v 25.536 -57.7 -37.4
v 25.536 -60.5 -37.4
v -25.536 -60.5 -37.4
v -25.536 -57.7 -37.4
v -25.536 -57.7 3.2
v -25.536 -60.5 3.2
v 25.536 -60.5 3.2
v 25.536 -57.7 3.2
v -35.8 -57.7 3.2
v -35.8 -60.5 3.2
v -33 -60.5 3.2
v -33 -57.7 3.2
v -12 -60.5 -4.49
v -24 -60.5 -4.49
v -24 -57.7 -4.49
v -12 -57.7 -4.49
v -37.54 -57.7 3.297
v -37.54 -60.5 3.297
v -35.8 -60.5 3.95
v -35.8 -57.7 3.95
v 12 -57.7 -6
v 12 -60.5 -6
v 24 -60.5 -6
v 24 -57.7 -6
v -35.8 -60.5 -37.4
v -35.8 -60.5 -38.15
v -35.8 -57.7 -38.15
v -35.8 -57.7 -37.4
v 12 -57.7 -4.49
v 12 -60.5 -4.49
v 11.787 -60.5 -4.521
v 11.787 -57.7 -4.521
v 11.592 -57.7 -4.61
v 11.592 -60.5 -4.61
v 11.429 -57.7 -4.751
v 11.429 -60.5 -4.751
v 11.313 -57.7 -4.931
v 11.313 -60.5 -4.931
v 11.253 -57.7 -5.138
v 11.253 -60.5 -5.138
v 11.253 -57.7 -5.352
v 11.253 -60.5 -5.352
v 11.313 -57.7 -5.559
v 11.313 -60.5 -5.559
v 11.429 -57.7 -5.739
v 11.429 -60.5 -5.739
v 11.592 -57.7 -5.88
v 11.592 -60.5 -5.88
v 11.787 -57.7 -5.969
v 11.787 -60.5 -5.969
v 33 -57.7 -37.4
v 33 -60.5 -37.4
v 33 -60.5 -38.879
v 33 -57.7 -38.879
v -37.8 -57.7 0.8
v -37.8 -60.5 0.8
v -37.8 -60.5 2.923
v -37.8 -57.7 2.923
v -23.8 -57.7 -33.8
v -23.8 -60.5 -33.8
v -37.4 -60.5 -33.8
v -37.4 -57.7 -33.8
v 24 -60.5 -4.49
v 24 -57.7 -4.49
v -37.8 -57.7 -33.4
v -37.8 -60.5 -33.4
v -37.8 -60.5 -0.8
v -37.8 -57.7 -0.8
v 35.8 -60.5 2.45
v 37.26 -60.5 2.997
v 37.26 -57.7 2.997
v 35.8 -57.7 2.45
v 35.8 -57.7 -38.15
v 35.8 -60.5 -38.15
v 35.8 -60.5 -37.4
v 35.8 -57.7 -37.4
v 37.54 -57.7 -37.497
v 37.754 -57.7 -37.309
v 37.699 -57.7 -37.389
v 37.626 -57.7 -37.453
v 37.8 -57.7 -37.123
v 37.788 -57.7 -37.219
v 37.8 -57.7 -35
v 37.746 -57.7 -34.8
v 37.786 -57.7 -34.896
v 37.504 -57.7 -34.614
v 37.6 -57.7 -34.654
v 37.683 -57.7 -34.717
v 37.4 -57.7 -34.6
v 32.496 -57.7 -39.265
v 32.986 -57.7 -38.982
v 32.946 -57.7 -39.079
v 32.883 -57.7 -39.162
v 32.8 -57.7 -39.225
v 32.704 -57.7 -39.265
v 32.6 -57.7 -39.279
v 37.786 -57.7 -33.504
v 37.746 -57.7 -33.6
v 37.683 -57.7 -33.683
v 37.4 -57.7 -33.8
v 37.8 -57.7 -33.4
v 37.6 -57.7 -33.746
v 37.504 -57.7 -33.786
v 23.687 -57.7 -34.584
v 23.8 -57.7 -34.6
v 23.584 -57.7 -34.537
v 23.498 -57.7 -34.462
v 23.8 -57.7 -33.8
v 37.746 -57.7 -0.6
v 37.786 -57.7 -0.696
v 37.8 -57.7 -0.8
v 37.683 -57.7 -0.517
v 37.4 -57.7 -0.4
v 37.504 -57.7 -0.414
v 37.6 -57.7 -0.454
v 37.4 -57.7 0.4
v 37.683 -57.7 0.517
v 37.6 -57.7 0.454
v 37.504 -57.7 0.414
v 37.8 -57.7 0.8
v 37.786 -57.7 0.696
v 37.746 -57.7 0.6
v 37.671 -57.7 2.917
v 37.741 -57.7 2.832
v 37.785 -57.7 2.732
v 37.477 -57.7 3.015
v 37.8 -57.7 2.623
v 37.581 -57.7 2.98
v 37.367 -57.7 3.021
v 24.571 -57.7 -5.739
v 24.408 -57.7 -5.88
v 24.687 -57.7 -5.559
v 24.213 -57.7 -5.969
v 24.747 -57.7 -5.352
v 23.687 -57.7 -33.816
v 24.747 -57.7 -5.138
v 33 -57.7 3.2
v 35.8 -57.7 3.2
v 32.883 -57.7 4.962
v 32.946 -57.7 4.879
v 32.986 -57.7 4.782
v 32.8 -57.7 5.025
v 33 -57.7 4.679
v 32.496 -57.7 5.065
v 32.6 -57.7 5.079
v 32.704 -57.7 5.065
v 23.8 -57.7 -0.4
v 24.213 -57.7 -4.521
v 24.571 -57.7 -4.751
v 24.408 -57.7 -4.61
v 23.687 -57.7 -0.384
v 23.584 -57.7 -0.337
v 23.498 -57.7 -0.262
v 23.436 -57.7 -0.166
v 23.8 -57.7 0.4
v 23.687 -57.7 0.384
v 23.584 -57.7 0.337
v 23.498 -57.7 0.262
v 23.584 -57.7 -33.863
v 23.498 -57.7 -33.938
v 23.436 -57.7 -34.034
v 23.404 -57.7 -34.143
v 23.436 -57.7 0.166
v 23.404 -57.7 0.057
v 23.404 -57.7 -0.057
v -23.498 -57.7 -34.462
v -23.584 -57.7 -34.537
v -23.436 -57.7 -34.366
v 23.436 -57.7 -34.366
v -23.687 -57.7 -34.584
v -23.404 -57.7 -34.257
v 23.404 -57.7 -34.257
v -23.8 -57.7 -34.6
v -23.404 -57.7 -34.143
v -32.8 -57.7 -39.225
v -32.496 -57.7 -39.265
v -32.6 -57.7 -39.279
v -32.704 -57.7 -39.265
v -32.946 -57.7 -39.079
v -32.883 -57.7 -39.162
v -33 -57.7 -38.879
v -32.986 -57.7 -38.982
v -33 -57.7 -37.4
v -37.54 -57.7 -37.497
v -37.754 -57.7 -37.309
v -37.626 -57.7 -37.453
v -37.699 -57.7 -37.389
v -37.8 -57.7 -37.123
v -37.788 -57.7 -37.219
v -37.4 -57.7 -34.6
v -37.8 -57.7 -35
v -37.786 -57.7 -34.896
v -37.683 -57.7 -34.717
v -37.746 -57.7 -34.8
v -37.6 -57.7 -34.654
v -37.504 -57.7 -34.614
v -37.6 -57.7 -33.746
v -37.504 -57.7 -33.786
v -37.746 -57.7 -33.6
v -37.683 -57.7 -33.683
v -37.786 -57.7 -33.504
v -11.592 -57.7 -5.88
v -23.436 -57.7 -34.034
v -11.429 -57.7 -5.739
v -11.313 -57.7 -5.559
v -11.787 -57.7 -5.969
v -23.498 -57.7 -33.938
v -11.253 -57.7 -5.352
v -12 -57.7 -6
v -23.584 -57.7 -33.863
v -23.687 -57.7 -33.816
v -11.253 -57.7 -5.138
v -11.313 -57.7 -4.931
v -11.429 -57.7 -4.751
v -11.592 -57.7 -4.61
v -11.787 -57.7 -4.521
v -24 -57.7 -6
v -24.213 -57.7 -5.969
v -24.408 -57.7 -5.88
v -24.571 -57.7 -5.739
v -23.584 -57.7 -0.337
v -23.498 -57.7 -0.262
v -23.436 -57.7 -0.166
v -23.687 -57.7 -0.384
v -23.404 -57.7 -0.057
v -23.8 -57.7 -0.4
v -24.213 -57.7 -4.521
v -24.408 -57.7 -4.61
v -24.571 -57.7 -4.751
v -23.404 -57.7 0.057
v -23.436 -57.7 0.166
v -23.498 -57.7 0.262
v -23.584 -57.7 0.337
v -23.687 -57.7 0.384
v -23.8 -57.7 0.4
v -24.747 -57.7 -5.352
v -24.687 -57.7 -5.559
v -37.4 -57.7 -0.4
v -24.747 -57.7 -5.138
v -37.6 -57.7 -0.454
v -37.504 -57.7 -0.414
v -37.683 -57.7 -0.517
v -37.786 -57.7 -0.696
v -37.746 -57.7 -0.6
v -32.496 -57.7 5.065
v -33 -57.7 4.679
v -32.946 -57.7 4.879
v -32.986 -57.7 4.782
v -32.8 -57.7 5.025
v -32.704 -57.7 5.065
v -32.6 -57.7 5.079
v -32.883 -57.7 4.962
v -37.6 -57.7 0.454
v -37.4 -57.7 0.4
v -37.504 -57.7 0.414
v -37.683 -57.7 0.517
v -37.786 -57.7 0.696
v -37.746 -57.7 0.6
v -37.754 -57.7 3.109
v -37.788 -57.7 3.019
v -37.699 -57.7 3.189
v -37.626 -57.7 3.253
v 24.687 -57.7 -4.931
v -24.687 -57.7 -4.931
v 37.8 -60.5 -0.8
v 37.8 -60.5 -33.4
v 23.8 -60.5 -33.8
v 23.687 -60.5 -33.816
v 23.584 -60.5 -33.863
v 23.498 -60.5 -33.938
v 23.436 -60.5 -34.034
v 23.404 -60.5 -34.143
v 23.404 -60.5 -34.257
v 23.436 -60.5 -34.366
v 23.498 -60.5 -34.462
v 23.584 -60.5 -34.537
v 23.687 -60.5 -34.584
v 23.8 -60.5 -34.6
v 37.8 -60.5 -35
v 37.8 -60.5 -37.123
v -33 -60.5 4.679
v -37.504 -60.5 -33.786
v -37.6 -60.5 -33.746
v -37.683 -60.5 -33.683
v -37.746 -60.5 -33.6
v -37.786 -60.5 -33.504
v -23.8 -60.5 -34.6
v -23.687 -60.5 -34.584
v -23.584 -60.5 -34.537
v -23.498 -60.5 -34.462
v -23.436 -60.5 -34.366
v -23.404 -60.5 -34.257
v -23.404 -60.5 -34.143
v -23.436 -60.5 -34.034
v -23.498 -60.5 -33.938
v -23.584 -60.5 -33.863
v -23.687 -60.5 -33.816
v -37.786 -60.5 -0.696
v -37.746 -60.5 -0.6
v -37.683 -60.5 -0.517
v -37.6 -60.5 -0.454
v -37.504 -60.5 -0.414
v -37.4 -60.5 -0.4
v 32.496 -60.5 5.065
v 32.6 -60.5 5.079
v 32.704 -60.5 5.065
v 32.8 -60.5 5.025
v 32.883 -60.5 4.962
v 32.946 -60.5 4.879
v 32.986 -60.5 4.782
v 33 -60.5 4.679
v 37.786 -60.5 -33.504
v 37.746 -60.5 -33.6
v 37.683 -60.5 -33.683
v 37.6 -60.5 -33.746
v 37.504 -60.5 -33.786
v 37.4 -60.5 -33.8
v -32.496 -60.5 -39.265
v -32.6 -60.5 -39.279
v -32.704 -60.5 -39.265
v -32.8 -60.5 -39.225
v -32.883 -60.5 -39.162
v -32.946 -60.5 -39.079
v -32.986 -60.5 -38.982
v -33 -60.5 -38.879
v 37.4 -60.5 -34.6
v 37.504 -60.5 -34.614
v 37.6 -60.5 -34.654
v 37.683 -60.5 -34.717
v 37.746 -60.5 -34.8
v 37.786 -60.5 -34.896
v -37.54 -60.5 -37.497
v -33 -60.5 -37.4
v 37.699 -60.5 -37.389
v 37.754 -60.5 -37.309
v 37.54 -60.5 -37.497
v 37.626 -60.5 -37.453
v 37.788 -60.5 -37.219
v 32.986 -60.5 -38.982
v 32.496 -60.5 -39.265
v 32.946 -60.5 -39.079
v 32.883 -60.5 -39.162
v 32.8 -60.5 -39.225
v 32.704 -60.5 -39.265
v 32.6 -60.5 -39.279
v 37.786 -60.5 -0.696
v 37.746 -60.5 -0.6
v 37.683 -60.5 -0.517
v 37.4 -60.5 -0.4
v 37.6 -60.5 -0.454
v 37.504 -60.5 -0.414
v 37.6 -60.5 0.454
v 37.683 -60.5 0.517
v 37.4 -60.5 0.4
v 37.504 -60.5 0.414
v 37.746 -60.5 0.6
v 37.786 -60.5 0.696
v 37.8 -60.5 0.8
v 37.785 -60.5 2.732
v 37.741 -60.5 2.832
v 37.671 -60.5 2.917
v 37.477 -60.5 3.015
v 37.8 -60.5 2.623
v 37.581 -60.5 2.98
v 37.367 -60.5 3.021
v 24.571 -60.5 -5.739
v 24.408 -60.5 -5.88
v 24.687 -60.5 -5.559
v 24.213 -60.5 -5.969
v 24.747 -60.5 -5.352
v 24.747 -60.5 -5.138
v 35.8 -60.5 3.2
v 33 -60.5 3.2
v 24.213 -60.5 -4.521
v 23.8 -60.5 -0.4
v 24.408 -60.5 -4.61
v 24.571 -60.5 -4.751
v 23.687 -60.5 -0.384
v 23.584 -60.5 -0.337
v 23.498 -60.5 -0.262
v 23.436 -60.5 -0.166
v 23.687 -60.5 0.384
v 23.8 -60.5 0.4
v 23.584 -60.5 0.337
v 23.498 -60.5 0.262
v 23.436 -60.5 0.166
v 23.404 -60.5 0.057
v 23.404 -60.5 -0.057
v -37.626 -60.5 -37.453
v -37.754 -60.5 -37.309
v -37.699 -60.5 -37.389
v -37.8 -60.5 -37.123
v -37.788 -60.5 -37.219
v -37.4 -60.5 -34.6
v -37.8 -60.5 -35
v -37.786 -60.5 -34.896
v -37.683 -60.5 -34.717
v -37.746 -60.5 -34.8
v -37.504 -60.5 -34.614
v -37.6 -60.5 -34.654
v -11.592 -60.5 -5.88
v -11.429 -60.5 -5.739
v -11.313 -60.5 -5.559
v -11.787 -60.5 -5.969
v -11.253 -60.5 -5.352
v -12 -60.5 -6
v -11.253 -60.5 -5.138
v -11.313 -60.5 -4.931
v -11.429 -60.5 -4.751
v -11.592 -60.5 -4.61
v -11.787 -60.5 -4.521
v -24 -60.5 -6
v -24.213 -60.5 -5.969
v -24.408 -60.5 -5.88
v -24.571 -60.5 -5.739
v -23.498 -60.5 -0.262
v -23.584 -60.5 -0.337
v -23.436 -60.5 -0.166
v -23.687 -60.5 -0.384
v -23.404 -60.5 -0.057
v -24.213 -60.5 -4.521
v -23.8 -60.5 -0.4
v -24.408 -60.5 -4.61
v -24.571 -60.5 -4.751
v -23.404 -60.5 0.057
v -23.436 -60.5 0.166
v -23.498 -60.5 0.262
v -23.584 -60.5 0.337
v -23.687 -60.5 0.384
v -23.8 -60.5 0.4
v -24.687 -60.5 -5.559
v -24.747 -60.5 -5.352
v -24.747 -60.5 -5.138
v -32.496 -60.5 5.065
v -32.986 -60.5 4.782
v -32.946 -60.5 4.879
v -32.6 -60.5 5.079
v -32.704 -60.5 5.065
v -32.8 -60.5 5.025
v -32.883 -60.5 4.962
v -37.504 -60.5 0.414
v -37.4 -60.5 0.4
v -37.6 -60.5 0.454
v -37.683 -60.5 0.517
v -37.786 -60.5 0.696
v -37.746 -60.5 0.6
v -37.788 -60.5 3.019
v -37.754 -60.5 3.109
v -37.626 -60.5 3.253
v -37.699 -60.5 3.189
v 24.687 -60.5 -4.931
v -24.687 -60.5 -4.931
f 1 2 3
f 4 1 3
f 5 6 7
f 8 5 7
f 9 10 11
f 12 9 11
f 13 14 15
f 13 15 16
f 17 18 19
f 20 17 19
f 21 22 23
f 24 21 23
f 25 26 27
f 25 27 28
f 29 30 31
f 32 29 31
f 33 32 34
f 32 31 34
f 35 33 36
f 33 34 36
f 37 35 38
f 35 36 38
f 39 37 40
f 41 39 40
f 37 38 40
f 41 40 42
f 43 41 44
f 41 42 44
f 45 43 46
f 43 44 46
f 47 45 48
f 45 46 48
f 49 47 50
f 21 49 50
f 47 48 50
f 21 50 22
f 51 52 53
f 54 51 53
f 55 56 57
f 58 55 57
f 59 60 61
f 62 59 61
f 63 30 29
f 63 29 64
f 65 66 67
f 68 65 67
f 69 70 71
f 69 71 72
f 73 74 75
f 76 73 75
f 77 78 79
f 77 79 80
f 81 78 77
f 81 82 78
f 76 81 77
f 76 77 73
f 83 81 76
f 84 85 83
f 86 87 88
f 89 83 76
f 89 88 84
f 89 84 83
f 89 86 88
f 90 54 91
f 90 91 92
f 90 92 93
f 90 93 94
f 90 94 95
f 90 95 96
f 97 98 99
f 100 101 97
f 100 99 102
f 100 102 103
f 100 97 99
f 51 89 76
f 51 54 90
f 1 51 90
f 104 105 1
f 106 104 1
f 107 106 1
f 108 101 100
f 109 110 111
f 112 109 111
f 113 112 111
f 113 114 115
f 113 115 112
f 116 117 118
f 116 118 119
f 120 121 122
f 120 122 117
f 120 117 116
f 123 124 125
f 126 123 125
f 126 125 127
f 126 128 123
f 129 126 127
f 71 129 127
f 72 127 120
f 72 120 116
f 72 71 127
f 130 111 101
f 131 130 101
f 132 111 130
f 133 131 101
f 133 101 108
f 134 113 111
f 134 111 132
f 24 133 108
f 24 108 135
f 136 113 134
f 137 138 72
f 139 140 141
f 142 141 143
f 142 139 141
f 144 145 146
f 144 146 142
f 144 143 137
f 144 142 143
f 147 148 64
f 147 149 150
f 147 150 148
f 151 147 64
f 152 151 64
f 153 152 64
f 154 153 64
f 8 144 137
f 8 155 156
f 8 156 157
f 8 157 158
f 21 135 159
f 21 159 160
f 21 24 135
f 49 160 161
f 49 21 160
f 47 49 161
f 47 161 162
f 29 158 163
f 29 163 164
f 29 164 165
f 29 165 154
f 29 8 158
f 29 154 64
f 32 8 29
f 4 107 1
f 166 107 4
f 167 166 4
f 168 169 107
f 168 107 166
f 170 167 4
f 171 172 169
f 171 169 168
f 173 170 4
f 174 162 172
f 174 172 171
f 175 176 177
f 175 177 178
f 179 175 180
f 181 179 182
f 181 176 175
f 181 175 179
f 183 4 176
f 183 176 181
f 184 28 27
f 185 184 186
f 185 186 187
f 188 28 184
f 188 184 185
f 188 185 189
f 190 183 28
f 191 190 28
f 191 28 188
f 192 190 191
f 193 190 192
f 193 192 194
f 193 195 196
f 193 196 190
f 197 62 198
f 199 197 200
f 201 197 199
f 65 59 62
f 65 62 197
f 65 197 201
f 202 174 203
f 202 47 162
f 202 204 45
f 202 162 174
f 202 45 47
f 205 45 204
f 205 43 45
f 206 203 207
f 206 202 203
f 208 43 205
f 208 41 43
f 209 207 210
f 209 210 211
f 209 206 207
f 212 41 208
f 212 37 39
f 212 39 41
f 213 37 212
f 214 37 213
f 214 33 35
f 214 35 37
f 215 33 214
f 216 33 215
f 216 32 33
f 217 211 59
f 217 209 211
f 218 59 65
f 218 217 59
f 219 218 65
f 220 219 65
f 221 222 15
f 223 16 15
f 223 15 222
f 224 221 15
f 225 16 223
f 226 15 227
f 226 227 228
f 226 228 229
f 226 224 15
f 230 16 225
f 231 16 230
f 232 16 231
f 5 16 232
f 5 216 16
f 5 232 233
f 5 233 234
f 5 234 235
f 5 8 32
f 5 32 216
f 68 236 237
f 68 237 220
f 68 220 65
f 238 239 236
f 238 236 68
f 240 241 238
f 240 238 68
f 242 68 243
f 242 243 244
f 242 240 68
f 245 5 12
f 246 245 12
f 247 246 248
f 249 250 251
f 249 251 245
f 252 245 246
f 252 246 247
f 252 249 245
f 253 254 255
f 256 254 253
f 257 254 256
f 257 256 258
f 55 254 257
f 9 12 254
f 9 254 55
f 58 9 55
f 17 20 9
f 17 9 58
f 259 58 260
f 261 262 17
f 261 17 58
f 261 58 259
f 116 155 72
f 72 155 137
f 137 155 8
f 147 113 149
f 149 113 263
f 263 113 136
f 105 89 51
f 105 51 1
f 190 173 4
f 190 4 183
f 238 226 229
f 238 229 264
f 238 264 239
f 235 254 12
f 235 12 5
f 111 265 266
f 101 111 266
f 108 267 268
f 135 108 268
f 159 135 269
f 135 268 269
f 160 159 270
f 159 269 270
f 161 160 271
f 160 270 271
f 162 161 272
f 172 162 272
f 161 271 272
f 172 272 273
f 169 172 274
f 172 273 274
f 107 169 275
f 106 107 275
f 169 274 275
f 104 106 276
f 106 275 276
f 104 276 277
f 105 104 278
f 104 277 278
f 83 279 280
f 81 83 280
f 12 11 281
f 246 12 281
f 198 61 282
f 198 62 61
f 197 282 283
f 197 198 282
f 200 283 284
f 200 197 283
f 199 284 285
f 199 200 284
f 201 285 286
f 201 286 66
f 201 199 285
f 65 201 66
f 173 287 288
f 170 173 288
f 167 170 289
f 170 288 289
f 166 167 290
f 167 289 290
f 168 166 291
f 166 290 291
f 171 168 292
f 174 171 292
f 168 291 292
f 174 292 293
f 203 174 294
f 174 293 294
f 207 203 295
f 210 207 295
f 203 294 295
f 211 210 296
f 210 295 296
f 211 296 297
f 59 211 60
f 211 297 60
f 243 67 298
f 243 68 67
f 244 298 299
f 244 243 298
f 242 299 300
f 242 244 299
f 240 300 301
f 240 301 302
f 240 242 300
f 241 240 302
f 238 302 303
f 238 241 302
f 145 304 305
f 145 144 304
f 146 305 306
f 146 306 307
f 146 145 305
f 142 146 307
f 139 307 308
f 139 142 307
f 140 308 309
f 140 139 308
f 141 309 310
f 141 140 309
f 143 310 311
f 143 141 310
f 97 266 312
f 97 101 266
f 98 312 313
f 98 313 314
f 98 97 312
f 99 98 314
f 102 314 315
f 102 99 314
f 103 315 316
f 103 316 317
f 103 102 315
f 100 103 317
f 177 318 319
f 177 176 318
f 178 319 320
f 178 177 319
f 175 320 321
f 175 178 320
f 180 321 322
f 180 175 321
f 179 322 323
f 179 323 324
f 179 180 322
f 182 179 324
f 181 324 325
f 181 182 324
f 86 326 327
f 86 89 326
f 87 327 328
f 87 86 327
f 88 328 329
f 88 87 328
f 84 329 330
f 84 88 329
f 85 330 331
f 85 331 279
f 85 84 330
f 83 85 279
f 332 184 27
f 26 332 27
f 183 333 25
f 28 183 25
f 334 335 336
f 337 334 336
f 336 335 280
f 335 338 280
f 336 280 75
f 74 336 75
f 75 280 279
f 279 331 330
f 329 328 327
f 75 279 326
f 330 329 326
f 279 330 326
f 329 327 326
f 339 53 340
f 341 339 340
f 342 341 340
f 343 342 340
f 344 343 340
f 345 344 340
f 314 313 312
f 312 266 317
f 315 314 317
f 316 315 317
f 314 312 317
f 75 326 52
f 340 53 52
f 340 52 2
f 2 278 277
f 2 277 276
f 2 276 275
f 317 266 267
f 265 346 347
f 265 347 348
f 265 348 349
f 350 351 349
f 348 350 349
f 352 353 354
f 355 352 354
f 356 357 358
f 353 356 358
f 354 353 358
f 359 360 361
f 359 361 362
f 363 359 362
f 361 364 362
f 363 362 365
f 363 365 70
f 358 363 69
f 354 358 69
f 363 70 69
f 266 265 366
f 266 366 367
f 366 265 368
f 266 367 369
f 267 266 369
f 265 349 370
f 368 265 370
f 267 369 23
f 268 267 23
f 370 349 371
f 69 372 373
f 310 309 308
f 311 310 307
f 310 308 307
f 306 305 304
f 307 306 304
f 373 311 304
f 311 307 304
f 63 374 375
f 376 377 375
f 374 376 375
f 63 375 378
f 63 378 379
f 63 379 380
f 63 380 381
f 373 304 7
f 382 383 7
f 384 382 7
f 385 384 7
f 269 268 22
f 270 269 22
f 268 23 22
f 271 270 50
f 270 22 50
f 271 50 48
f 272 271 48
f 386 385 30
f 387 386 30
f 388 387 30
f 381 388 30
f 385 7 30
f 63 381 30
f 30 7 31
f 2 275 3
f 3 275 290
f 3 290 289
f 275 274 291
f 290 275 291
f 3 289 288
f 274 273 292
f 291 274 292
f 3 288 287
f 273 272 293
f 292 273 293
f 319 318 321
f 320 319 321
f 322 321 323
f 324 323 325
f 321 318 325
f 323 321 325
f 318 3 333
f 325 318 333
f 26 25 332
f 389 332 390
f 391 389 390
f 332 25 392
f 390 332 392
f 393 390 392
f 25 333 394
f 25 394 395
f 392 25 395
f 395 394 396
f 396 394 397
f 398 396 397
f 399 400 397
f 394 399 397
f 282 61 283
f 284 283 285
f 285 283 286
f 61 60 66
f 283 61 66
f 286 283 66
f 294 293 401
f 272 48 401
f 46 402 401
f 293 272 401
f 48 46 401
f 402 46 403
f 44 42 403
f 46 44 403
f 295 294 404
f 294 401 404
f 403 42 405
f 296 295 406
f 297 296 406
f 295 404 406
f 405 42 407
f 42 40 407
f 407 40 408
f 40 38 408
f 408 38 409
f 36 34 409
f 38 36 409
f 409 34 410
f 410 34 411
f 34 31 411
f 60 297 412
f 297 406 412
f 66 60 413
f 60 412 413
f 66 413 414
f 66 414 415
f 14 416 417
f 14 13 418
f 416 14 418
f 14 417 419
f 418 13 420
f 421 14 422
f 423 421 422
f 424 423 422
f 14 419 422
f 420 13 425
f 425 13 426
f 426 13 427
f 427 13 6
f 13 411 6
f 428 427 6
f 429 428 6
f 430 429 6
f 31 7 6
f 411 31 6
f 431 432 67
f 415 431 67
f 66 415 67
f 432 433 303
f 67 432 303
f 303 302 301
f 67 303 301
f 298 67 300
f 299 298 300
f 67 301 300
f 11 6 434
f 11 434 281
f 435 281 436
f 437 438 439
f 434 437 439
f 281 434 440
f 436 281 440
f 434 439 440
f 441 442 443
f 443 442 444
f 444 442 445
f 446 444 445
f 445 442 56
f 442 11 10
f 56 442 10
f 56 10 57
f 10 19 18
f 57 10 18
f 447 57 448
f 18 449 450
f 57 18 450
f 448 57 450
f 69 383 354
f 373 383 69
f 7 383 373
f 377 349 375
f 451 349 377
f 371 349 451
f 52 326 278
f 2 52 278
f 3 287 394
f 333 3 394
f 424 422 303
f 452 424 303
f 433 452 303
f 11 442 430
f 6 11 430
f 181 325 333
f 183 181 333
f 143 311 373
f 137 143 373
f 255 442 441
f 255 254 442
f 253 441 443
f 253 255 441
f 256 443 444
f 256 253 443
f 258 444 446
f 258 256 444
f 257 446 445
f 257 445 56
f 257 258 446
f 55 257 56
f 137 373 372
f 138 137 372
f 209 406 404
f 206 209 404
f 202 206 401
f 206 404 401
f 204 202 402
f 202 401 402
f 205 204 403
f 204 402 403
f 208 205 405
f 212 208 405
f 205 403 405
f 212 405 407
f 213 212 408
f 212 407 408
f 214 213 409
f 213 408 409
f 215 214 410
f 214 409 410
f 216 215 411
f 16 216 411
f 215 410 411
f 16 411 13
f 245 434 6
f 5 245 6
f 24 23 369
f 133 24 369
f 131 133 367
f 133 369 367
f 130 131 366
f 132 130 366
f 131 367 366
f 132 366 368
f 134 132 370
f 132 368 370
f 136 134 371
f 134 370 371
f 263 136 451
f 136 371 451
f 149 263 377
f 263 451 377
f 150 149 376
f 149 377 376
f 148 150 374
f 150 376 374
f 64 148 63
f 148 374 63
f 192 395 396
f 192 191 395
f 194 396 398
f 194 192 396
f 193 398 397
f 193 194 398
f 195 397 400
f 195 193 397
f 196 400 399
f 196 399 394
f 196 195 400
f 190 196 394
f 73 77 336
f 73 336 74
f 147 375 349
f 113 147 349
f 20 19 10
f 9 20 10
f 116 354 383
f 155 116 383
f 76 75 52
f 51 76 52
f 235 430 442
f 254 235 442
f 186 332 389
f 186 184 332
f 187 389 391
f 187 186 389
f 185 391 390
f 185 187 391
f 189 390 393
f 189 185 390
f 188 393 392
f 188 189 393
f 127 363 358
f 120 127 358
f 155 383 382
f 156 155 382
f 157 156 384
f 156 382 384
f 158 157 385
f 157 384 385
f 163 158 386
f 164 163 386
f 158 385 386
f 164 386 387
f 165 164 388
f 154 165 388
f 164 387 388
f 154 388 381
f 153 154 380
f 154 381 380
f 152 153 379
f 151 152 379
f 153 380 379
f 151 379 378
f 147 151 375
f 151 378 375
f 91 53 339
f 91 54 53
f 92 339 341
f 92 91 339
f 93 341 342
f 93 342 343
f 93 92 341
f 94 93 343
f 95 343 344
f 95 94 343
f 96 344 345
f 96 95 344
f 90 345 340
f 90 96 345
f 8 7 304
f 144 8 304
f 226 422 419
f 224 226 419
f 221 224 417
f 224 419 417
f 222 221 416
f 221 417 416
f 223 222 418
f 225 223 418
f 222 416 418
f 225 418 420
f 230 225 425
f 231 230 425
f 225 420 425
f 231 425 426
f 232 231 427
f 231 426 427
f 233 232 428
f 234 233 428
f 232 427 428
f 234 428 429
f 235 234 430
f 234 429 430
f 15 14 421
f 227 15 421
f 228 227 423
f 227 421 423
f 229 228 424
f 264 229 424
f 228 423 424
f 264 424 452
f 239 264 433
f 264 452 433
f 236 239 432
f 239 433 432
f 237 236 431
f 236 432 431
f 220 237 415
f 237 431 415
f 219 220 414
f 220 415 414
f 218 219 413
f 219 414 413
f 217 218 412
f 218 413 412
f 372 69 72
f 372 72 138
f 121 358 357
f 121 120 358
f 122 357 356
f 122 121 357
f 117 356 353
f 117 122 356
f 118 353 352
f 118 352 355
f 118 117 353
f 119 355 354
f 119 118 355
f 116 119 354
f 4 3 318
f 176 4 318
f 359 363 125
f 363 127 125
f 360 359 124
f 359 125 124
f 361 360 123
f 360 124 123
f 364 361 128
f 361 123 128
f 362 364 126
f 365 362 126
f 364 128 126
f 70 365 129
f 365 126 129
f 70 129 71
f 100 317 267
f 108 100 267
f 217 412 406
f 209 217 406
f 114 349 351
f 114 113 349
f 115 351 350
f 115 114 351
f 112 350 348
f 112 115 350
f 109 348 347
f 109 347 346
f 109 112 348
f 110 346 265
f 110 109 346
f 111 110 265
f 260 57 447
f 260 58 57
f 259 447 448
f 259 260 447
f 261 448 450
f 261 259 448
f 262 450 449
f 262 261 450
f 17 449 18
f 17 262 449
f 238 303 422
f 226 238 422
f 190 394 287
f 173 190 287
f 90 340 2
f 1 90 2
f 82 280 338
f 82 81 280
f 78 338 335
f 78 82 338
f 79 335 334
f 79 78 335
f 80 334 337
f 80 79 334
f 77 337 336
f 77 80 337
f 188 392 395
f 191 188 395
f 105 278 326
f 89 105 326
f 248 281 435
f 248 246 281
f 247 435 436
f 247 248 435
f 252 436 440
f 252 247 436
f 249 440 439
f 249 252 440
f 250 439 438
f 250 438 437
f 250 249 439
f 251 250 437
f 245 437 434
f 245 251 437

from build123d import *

# Parameters (mm, degrees)
PAD009_DEPTH    = 2.8
FILLET004_R     = 0.4
POCKET014_DEPTH = 2.801


with BuildPart() as part:
    # Sketch009 (on Face6 of ShapeBinder008) → Pad009 (new body)
    with BuildSketch(Plane.XZ.offset(60.5)):
        with BuildLine():
            Line((37.8, 3.2), (37.8, 0.4))
            Line((37.8, 0.4), (23.8, 0.4))
            ThreePointArc((23.8, 0.4), (23.4, 0), (23.8, -0.4))
            Line((23.8, -0.4), (37.8, -0.4))
            Line((37.8, -0.4), (37.8, -33.8))
            Line((37.8, -33.8), (23.8, -33.8))
            ThreePointArc((23.8, -33.8), (23.4, -34.2), (23.8, -34.6))
            Line((23.8, -34.6), (37.8, -34.6))
            Line((37.8, -34.6), (37.8, -37.4))
            Line((37.8, -37.4), (35.8, -38.15))
            Line((35.8, -38.15), (35.8, -37.4))
            Line((35.8, -37.4), (33, -37.4))
            Line((33, -37.4), (33, -39.4))
            Line((33, -39.4), (25.535898, -37.4))
            Line((25.535898, -37.4), (-25.535898, -37.4))
            Line((-25.535898, -37.4), (-33, -39.4))
            Line((-33, -39.4), (-33, -37.4))
            Line((-33, -37.4), (-35.8, -37.4))
            Line((-35.8, -38.15), (-35.8, -37.4))
            Line((-37.8, -37.4), (-35.8, -38.15))
            Line((-37.8, -37.4), (-37.8, -34.6))
            Line((-37.8, -34.6), (-23.8, -34.6))
            ThreePointArc((-23.8, -34.6), (-23.4, -34.2), (-23.8, -33.8))
            Line((-23.8, -33.8), (-37.8, -33.8))
            Line((-37.8, -33.8), (-37.8, -0.4))
            Line((-37.8, -0.4), (-23.8, -0.4))
            ThreePointArc((-23.8, -0.4), (-23.4, 0), (-23.8, 0.4))
            Line((-23.8, 0.4), (-37.8, 0.4))
            Line((-37.8, 0.4), (-37.8, 3.2))
            Line((-37.8, 3.2), (-35.8, 3.95))
            Line((-35.8, 3.95), (-35.8, 3.2))
            Line((-35.8, 3.2), (-33, 3.2))
            Line((-33, 3.2), (-33, 5.2))
            Line((-33, 5.2), (-25.535898, 3.2))
            Line((-25.535898, 3.2), (25.535898, 3.2))
            Line((25.535898, 3.2), (33, 5.2))
            Line((33, 5.2), (33, 3.2))
            Line((33, 3.2), (35.8, 3.2))
            Line((35.8, 2.45), (35.8, 3.2))
            Line((37.8, 3.2), (35.8, 2.45))
        make_face()
    extrude(amount=-PAD009_DEPTH)

    # Fillet004
    fillet004_edges = [part.edges().sort_by_distance(p)[0] for p in [
        (33, -59.1, 5.2),
        (37.8, -59.1, 3.2),
        (37.8, -59.1, 0.4),
        (37.8, -59.1, -0.4),
        (37.8, -59.1, -33.8),
        (37.8, -59.1, -34.6),
        (37.8, -59.1, -37.4),
        (33, -59.1, -39.4),
        (-37.8, -59.1, -33.8),
        (-37.8, -59.1, -34.6),
        (-37.8, -59.1, -37.4),
        (-33, -59.1, -39.4),
        (-33, -59.1, 5.2),
        (-37.8, -59.1, 3.2),
        (-37.8, -59.1, 0.4),
        (-37.8, -59.1, -0.4),
    ]]
    fillet(fillet004_edges, radius=FILLET004_R)

    # Sketch025 (on Face2 of Fillet004) → Pocket014 (cut, through all)
    with BuildSketch(Plane.XZ.offset(60.5)):
        with BuildLine():
            ThreePointArc((-24, -4.49), (-24.755, -5.245), (-24, -6))
            Line((-24, -6), (-12, -6))
            ThreePointArc((-12, -6), (-11.245, -5.245), (-12, -4.49))
            Line((-24, -4.49), (-12, -4.49))
        make_face()
        with BuildLine():
            ThreePointArc((12, -4.49), (11.245, -5.245), (12, -6))
            Line((12, -6), (24, -6))
            ThreePointArc((24, -6), (24.755, -5.245), (24, -4.49))
            Line((12, -4.49), (24, -4.49))
        make_face()
    extrude(amount=-POCKET014_DEPTH, mode=Mode.SUBTRACT)


solid = part.part
